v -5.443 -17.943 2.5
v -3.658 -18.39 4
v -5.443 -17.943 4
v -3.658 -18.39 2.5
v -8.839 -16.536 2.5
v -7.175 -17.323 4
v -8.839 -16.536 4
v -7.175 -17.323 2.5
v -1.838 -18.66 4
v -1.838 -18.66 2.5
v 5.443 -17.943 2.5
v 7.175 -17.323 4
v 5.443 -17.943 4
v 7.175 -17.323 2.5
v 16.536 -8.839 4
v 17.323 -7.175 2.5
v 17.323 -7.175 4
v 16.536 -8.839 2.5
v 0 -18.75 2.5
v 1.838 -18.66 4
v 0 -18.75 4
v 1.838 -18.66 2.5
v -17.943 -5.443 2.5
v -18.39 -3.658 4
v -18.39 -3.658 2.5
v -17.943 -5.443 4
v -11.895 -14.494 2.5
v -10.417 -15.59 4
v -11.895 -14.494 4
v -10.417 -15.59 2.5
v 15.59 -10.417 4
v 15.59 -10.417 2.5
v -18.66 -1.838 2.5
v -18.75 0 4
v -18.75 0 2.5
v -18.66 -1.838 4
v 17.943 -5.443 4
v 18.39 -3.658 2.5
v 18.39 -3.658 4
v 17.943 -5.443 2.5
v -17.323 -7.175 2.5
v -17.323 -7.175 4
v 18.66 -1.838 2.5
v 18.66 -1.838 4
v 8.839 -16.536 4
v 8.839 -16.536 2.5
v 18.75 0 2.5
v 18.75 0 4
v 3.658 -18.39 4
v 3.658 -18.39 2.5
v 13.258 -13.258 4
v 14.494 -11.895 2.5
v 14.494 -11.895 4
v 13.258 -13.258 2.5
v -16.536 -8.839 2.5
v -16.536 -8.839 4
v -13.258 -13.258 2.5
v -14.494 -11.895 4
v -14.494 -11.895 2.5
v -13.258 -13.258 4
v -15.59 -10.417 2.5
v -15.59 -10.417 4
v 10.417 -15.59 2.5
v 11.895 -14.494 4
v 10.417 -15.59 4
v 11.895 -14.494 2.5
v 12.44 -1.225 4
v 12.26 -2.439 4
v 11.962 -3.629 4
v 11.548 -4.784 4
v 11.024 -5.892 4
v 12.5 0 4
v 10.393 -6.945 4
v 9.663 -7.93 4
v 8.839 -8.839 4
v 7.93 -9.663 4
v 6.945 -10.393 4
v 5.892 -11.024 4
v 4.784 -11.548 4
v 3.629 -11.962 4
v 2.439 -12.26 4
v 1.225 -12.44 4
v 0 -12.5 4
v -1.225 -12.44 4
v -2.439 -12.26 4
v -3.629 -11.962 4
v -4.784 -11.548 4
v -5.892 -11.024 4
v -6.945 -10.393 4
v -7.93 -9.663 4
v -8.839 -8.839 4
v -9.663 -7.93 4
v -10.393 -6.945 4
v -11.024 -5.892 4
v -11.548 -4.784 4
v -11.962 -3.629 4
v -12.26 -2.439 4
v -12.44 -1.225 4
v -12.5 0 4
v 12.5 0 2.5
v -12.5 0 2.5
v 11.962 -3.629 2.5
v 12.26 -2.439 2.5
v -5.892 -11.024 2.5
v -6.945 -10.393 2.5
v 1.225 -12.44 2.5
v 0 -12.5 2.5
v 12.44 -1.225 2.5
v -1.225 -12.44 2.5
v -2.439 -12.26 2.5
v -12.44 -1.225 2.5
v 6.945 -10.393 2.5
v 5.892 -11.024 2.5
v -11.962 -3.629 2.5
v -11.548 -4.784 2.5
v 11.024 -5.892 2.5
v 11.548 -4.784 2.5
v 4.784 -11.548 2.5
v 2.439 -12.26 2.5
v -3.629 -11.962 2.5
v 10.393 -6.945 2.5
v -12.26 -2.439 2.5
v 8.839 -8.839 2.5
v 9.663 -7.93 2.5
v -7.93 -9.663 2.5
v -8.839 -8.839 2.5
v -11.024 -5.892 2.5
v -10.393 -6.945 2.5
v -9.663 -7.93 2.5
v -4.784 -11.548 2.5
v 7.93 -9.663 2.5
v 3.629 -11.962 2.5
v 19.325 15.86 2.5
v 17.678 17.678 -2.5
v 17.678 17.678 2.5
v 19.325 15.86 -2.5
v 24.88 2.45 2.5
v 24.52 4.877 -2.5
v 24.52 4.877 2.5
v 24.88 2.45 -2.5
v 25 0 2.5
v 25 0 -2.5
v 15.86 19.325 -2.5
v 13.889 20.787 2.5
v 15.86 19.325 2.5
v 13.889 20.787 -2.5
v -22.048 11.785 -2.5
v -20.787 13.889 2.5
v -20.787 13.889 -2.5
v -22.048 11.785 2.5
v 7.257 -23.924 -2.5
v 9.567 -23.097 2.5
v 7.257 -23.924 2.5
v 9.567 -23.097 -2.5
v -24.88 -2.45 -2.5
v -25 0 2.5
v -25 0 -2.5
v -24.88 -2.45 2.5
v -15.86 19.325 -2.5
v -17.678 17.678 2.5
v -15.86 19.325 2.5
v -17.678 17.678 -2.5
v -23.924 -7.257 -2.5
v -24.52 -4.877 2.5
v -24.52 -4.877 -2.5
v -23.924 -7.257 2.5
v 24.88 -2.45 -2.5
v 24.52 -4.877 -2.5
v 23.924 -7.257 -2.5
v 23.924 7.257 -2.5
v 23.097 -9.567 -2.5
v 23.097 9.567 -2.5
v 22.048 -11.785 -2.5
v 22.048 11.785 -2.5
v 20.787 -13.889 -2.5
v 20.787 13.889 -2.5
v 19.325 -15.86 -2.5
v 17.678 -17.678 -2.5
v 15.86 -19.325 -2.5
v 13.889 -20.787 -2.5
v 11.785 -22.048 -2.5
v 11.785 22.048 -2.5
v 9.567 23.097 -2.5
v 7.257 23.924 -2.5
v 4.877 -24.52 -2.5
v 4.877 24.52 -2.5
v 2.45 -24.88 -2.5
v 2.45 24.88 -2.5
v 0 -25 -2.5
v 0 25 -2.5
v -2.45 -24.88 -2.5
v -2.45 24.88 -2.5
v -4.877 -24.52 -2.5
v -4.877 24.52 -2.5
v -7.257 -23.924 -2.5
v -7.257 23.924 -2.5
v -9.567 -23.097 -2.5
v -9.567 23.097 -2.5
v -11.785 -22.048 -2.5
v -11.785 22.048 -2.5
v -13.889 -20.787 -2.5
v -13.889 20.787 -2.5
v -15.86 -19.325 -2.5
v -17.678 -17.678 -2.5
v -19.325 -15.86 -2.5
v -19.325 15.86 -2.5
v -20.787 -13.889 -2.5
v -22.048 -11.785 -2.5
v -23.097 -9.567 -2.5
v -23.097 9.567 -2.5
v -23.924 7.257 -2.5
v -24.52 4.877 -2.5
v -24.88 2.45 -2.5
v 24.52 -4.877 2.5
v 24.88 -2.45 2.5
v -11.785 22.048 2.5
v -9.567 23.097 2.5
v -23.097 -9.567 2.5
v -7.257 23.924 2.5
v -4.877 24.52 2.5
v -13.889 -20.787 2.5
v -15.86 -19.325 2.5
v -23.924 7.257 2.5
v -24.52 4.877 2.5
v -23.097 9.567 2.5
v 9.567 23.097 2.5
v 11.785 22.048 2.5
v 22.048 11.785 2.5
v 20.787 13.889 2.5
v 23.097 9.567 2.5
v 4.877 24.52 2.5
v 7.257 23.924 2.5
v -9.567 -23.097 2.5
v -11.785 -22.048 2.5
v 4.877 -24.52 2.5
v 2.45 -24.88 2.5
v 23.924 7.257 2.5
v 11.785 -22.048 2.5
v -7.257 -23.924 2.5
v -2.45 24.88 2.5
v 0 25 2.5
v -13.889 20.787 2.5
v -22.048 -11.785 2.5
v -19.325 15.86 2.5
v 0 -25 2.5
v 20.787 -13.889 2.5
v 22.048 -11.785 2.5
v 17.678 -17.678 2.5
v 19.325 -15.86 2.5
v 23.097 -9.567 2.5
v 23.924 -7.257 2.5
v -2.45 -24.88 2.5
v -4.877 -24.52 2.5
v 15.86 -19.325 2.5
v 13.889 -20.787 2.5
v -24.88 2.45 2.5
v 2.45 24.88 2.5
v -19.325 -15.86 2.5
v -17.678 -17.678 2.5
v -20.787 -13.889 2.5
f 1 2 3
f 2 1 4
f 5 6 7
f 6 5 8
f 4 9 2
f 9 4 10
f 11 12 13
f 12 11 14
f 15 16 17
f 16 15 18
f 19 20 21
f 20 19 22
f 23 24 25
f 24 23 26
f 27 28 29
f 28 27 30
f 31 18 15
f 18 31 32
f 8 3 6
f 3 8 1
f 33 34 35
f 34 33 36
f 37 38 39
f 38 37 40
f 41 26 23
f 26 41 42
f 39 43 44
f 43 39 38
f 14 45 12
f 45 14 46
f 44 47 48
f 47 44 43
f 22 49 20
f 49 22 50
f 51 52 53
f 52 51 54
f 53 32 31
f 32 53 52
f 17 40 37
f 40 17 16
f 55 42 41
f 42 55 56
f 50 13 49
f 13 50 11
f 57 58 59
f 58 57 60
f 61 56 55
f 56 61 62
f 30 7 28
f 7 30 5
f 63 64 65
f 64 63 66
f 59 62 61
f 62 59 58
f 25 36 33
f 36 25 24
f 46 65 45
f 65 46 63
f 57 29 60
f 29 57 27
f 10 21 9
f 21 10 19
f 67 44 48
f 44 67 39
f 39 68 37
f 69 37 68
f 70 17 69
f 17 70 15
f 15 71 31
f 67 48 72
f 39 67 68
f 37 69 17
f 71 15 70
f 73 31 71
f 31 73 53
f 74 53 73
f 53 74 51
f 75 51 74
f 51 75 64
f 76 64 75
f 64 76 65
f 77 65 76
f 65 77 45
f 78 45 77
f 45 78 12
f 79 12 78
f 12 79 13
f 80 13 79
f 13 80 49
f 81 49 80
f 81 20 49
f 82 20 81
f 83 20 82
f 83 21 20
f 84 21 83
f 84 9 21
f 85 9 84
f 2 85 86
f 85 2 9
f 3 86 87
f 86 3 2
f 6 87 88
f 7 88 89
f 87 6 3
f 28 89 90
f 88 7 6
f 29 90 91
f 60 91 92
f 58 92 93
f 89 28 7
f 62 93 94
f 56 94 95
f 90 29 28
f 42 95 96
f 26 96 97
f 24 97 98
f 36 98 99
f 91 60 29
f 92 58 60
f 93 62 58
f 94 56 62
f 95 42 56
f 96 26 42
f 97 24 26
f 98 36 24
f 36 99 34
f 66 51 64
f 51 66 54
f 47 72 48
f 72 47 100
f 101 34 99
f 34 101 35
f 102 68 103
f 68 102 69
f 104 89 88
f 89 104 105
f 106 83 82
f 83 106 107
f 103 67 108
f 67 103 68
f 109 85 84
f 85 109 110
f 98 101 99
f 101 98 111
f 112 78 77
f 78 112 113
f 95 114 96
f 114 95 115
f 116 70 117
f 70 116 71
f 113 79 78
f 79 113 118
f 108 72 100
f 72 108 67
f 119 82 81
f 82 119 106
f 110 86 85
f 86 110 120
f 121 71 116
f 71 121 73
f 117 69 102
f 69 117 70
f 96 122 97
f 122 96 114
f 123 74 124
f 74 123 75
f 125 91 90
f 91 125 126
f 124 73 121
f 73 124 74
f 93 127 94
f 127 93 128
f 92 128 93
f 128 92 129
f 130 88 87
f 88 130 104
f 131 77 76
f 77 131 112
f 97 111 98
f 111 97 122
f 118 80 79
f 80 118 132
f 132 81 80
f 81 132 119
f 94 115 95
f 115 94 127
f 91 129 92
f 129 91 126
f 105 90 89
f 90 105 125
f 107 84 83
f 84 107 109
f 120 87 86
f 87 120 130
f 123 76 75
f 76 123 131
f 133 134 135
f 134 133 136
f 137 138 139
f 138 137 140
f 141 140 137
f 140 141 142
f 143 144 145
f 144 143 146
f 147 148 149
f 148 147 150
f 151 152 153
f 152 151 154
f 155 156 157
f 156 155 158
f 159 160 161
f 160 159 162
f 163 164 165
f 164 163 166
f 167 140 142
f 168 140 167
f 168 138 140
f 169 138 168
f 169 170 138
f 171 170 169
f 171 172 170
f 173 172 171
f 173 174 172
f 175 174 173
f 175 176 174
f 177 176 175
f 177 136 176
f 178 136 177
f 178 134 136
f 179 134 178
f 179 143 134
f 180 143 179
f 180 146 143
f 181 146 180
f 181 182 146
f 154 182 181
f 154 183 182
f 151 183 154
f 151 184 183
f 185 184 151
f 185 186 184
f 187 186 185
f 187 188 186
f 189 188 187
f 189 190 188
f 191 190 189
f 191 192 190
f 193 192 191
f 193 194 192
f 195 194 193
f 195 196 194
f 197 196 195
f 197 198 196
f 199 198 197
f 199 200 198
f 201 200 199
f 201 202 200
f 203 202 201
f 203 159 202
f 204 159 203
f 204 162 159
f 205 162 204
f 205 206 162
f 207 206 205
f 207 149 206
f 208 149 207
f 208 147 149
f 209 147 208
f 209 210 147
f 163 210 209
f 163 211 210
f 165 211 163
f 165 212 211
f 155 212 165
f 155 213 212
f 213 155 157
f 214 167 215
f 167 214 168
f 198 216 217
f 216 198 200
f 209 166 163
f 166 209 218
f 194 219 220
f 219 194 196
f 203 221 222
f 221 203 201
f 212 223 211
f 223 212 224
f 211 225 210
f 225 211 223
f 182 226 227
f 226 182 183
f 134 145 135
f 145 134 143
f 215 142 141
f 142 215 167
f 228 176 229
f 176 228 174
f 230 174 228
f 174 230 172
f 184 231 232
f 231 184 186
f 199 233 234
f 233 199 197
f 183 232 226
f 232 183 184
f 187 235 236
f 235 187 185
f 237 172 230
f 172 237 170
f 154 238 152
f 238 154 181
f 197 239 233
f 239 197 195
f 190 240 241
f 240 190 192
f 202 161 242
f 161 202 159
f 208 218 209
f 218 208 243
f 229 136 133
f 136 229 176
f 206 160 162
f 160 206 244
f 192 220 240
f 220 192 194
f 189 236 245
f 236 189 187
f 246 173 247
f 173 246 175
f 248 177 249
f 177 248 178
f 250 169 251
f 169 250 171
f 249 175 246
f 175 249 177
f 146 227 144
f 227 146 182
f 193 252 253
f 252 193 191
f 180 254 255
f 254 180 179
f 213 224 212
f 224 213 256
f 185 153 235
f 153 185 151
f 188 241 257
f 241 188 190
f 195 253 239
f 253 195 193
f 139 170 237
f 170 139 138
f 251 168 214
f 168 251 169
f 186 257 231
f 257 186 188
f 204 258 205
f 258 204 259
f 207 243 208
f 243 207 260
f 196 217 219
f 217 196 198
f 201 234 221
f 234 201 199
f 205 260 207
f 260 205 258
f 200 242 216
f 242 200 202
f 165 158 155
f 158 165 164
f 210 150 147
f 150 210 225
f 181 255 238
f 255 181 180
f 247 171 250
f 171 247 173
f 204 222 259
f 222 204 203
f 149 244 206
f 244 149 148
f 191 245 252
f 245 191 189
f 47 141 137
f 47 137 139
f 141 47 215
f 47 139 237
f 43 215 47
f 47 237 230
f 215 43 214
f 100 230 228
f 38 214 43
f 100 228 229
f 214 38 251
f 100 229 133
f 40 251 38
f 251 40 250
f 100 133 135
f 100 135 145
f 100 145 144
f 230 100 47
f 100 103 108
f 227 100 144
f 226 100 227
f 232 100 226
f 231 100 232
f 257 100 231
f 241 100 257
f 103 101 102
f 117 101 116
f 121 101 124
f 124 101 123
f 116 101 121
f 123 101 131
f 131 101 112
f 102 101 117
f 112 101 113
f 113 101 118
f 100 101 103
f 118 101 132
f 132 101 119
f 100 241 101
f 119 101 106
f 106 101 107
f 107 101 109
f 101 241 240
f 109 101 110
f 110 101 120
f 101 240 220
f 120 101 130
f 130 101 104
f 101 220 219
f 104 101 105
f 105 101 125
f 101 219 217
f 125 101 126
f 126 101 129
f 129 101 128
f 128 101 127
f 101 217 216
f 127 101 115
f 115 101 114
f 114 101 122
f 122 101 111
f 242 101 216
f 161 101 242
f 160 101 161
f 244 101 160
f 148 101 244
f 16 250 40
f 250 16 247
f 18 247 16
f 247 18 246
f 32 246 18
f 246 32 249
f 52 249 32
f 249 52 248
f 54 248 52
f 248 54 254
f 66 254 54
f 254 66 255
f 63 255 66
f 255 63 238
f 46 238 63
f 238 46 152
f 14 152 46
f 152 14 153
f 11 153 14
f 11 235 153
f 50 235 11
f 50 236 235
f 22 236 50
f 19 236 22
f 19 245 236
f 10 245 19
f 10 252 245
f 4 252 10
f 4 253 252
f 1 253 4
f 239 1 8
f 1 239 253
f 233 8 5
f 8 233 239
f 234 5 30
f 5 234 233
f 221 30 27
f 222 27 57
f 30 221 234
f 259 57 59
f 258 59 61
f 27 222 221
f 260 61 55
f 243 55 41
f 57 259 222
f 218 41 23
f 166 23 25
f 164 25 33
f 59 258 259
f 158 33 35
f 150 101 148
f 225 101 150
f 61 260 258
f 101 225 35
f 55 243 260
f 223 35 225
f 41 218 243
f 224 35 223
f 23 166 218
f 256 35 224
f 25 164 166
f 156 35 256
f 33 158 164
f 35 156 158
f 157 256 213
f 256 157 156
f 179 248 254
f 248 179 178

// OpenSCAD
// [FL_INDEX: keywords="openscad, 3d_parametric, Test, csg_solid" | COT="Parametric OpenSCAD design from 3DCodeverse"]
// Title: Test

MouthX=0;//[-200:200]
MouthY=0;//[-200:200]
//Does He have a big mouth?
MouthSize=25;//[25:100]
//Rotating the mouth 180 makes it a sad face instead of a happy face.
MouthRotate=0;//[0:364]



//How strong is the emotion?
Mouth="Very";//[Super,Very]
height=5;
radius=25;
thing(Mouth, height,radius,MouthSize,MouthX);

module thing(Mouth){
$fn=64;

	color([0,1,1])
	cylinder(h=height,r=radius,center=true);

	if (Mouth=="Super"){
rotate([0,0,MouthRotate])		
1happyMouth( );
	}else if (Mouth=="Very"){
rotate([0,0,MouthRotate])		
happyMouth( );
	}
}


module 1happyMouth(){

translate([MouthX,MouthY,height/2]){
	difference(){
		cylinder(r=MouthSize-MouthSize/4,h=2,center=true);
		translate([MouthX,23,0])
		cube([1000,MouthSize*2,100],center=true);
}
}	
}




module happyMouth( ){
translate([MouthX,MouthY,height/2]){
	difference(){
		cylinder(r=MouthSize-MouthSize/4,h=3,center=true);
		translate([MouthX,17.5,0])
		cube([500,MouthSize+10,20],center=true);
		cylinder(r=MouthSize/2,h=20,center=true);
	}
}
}
